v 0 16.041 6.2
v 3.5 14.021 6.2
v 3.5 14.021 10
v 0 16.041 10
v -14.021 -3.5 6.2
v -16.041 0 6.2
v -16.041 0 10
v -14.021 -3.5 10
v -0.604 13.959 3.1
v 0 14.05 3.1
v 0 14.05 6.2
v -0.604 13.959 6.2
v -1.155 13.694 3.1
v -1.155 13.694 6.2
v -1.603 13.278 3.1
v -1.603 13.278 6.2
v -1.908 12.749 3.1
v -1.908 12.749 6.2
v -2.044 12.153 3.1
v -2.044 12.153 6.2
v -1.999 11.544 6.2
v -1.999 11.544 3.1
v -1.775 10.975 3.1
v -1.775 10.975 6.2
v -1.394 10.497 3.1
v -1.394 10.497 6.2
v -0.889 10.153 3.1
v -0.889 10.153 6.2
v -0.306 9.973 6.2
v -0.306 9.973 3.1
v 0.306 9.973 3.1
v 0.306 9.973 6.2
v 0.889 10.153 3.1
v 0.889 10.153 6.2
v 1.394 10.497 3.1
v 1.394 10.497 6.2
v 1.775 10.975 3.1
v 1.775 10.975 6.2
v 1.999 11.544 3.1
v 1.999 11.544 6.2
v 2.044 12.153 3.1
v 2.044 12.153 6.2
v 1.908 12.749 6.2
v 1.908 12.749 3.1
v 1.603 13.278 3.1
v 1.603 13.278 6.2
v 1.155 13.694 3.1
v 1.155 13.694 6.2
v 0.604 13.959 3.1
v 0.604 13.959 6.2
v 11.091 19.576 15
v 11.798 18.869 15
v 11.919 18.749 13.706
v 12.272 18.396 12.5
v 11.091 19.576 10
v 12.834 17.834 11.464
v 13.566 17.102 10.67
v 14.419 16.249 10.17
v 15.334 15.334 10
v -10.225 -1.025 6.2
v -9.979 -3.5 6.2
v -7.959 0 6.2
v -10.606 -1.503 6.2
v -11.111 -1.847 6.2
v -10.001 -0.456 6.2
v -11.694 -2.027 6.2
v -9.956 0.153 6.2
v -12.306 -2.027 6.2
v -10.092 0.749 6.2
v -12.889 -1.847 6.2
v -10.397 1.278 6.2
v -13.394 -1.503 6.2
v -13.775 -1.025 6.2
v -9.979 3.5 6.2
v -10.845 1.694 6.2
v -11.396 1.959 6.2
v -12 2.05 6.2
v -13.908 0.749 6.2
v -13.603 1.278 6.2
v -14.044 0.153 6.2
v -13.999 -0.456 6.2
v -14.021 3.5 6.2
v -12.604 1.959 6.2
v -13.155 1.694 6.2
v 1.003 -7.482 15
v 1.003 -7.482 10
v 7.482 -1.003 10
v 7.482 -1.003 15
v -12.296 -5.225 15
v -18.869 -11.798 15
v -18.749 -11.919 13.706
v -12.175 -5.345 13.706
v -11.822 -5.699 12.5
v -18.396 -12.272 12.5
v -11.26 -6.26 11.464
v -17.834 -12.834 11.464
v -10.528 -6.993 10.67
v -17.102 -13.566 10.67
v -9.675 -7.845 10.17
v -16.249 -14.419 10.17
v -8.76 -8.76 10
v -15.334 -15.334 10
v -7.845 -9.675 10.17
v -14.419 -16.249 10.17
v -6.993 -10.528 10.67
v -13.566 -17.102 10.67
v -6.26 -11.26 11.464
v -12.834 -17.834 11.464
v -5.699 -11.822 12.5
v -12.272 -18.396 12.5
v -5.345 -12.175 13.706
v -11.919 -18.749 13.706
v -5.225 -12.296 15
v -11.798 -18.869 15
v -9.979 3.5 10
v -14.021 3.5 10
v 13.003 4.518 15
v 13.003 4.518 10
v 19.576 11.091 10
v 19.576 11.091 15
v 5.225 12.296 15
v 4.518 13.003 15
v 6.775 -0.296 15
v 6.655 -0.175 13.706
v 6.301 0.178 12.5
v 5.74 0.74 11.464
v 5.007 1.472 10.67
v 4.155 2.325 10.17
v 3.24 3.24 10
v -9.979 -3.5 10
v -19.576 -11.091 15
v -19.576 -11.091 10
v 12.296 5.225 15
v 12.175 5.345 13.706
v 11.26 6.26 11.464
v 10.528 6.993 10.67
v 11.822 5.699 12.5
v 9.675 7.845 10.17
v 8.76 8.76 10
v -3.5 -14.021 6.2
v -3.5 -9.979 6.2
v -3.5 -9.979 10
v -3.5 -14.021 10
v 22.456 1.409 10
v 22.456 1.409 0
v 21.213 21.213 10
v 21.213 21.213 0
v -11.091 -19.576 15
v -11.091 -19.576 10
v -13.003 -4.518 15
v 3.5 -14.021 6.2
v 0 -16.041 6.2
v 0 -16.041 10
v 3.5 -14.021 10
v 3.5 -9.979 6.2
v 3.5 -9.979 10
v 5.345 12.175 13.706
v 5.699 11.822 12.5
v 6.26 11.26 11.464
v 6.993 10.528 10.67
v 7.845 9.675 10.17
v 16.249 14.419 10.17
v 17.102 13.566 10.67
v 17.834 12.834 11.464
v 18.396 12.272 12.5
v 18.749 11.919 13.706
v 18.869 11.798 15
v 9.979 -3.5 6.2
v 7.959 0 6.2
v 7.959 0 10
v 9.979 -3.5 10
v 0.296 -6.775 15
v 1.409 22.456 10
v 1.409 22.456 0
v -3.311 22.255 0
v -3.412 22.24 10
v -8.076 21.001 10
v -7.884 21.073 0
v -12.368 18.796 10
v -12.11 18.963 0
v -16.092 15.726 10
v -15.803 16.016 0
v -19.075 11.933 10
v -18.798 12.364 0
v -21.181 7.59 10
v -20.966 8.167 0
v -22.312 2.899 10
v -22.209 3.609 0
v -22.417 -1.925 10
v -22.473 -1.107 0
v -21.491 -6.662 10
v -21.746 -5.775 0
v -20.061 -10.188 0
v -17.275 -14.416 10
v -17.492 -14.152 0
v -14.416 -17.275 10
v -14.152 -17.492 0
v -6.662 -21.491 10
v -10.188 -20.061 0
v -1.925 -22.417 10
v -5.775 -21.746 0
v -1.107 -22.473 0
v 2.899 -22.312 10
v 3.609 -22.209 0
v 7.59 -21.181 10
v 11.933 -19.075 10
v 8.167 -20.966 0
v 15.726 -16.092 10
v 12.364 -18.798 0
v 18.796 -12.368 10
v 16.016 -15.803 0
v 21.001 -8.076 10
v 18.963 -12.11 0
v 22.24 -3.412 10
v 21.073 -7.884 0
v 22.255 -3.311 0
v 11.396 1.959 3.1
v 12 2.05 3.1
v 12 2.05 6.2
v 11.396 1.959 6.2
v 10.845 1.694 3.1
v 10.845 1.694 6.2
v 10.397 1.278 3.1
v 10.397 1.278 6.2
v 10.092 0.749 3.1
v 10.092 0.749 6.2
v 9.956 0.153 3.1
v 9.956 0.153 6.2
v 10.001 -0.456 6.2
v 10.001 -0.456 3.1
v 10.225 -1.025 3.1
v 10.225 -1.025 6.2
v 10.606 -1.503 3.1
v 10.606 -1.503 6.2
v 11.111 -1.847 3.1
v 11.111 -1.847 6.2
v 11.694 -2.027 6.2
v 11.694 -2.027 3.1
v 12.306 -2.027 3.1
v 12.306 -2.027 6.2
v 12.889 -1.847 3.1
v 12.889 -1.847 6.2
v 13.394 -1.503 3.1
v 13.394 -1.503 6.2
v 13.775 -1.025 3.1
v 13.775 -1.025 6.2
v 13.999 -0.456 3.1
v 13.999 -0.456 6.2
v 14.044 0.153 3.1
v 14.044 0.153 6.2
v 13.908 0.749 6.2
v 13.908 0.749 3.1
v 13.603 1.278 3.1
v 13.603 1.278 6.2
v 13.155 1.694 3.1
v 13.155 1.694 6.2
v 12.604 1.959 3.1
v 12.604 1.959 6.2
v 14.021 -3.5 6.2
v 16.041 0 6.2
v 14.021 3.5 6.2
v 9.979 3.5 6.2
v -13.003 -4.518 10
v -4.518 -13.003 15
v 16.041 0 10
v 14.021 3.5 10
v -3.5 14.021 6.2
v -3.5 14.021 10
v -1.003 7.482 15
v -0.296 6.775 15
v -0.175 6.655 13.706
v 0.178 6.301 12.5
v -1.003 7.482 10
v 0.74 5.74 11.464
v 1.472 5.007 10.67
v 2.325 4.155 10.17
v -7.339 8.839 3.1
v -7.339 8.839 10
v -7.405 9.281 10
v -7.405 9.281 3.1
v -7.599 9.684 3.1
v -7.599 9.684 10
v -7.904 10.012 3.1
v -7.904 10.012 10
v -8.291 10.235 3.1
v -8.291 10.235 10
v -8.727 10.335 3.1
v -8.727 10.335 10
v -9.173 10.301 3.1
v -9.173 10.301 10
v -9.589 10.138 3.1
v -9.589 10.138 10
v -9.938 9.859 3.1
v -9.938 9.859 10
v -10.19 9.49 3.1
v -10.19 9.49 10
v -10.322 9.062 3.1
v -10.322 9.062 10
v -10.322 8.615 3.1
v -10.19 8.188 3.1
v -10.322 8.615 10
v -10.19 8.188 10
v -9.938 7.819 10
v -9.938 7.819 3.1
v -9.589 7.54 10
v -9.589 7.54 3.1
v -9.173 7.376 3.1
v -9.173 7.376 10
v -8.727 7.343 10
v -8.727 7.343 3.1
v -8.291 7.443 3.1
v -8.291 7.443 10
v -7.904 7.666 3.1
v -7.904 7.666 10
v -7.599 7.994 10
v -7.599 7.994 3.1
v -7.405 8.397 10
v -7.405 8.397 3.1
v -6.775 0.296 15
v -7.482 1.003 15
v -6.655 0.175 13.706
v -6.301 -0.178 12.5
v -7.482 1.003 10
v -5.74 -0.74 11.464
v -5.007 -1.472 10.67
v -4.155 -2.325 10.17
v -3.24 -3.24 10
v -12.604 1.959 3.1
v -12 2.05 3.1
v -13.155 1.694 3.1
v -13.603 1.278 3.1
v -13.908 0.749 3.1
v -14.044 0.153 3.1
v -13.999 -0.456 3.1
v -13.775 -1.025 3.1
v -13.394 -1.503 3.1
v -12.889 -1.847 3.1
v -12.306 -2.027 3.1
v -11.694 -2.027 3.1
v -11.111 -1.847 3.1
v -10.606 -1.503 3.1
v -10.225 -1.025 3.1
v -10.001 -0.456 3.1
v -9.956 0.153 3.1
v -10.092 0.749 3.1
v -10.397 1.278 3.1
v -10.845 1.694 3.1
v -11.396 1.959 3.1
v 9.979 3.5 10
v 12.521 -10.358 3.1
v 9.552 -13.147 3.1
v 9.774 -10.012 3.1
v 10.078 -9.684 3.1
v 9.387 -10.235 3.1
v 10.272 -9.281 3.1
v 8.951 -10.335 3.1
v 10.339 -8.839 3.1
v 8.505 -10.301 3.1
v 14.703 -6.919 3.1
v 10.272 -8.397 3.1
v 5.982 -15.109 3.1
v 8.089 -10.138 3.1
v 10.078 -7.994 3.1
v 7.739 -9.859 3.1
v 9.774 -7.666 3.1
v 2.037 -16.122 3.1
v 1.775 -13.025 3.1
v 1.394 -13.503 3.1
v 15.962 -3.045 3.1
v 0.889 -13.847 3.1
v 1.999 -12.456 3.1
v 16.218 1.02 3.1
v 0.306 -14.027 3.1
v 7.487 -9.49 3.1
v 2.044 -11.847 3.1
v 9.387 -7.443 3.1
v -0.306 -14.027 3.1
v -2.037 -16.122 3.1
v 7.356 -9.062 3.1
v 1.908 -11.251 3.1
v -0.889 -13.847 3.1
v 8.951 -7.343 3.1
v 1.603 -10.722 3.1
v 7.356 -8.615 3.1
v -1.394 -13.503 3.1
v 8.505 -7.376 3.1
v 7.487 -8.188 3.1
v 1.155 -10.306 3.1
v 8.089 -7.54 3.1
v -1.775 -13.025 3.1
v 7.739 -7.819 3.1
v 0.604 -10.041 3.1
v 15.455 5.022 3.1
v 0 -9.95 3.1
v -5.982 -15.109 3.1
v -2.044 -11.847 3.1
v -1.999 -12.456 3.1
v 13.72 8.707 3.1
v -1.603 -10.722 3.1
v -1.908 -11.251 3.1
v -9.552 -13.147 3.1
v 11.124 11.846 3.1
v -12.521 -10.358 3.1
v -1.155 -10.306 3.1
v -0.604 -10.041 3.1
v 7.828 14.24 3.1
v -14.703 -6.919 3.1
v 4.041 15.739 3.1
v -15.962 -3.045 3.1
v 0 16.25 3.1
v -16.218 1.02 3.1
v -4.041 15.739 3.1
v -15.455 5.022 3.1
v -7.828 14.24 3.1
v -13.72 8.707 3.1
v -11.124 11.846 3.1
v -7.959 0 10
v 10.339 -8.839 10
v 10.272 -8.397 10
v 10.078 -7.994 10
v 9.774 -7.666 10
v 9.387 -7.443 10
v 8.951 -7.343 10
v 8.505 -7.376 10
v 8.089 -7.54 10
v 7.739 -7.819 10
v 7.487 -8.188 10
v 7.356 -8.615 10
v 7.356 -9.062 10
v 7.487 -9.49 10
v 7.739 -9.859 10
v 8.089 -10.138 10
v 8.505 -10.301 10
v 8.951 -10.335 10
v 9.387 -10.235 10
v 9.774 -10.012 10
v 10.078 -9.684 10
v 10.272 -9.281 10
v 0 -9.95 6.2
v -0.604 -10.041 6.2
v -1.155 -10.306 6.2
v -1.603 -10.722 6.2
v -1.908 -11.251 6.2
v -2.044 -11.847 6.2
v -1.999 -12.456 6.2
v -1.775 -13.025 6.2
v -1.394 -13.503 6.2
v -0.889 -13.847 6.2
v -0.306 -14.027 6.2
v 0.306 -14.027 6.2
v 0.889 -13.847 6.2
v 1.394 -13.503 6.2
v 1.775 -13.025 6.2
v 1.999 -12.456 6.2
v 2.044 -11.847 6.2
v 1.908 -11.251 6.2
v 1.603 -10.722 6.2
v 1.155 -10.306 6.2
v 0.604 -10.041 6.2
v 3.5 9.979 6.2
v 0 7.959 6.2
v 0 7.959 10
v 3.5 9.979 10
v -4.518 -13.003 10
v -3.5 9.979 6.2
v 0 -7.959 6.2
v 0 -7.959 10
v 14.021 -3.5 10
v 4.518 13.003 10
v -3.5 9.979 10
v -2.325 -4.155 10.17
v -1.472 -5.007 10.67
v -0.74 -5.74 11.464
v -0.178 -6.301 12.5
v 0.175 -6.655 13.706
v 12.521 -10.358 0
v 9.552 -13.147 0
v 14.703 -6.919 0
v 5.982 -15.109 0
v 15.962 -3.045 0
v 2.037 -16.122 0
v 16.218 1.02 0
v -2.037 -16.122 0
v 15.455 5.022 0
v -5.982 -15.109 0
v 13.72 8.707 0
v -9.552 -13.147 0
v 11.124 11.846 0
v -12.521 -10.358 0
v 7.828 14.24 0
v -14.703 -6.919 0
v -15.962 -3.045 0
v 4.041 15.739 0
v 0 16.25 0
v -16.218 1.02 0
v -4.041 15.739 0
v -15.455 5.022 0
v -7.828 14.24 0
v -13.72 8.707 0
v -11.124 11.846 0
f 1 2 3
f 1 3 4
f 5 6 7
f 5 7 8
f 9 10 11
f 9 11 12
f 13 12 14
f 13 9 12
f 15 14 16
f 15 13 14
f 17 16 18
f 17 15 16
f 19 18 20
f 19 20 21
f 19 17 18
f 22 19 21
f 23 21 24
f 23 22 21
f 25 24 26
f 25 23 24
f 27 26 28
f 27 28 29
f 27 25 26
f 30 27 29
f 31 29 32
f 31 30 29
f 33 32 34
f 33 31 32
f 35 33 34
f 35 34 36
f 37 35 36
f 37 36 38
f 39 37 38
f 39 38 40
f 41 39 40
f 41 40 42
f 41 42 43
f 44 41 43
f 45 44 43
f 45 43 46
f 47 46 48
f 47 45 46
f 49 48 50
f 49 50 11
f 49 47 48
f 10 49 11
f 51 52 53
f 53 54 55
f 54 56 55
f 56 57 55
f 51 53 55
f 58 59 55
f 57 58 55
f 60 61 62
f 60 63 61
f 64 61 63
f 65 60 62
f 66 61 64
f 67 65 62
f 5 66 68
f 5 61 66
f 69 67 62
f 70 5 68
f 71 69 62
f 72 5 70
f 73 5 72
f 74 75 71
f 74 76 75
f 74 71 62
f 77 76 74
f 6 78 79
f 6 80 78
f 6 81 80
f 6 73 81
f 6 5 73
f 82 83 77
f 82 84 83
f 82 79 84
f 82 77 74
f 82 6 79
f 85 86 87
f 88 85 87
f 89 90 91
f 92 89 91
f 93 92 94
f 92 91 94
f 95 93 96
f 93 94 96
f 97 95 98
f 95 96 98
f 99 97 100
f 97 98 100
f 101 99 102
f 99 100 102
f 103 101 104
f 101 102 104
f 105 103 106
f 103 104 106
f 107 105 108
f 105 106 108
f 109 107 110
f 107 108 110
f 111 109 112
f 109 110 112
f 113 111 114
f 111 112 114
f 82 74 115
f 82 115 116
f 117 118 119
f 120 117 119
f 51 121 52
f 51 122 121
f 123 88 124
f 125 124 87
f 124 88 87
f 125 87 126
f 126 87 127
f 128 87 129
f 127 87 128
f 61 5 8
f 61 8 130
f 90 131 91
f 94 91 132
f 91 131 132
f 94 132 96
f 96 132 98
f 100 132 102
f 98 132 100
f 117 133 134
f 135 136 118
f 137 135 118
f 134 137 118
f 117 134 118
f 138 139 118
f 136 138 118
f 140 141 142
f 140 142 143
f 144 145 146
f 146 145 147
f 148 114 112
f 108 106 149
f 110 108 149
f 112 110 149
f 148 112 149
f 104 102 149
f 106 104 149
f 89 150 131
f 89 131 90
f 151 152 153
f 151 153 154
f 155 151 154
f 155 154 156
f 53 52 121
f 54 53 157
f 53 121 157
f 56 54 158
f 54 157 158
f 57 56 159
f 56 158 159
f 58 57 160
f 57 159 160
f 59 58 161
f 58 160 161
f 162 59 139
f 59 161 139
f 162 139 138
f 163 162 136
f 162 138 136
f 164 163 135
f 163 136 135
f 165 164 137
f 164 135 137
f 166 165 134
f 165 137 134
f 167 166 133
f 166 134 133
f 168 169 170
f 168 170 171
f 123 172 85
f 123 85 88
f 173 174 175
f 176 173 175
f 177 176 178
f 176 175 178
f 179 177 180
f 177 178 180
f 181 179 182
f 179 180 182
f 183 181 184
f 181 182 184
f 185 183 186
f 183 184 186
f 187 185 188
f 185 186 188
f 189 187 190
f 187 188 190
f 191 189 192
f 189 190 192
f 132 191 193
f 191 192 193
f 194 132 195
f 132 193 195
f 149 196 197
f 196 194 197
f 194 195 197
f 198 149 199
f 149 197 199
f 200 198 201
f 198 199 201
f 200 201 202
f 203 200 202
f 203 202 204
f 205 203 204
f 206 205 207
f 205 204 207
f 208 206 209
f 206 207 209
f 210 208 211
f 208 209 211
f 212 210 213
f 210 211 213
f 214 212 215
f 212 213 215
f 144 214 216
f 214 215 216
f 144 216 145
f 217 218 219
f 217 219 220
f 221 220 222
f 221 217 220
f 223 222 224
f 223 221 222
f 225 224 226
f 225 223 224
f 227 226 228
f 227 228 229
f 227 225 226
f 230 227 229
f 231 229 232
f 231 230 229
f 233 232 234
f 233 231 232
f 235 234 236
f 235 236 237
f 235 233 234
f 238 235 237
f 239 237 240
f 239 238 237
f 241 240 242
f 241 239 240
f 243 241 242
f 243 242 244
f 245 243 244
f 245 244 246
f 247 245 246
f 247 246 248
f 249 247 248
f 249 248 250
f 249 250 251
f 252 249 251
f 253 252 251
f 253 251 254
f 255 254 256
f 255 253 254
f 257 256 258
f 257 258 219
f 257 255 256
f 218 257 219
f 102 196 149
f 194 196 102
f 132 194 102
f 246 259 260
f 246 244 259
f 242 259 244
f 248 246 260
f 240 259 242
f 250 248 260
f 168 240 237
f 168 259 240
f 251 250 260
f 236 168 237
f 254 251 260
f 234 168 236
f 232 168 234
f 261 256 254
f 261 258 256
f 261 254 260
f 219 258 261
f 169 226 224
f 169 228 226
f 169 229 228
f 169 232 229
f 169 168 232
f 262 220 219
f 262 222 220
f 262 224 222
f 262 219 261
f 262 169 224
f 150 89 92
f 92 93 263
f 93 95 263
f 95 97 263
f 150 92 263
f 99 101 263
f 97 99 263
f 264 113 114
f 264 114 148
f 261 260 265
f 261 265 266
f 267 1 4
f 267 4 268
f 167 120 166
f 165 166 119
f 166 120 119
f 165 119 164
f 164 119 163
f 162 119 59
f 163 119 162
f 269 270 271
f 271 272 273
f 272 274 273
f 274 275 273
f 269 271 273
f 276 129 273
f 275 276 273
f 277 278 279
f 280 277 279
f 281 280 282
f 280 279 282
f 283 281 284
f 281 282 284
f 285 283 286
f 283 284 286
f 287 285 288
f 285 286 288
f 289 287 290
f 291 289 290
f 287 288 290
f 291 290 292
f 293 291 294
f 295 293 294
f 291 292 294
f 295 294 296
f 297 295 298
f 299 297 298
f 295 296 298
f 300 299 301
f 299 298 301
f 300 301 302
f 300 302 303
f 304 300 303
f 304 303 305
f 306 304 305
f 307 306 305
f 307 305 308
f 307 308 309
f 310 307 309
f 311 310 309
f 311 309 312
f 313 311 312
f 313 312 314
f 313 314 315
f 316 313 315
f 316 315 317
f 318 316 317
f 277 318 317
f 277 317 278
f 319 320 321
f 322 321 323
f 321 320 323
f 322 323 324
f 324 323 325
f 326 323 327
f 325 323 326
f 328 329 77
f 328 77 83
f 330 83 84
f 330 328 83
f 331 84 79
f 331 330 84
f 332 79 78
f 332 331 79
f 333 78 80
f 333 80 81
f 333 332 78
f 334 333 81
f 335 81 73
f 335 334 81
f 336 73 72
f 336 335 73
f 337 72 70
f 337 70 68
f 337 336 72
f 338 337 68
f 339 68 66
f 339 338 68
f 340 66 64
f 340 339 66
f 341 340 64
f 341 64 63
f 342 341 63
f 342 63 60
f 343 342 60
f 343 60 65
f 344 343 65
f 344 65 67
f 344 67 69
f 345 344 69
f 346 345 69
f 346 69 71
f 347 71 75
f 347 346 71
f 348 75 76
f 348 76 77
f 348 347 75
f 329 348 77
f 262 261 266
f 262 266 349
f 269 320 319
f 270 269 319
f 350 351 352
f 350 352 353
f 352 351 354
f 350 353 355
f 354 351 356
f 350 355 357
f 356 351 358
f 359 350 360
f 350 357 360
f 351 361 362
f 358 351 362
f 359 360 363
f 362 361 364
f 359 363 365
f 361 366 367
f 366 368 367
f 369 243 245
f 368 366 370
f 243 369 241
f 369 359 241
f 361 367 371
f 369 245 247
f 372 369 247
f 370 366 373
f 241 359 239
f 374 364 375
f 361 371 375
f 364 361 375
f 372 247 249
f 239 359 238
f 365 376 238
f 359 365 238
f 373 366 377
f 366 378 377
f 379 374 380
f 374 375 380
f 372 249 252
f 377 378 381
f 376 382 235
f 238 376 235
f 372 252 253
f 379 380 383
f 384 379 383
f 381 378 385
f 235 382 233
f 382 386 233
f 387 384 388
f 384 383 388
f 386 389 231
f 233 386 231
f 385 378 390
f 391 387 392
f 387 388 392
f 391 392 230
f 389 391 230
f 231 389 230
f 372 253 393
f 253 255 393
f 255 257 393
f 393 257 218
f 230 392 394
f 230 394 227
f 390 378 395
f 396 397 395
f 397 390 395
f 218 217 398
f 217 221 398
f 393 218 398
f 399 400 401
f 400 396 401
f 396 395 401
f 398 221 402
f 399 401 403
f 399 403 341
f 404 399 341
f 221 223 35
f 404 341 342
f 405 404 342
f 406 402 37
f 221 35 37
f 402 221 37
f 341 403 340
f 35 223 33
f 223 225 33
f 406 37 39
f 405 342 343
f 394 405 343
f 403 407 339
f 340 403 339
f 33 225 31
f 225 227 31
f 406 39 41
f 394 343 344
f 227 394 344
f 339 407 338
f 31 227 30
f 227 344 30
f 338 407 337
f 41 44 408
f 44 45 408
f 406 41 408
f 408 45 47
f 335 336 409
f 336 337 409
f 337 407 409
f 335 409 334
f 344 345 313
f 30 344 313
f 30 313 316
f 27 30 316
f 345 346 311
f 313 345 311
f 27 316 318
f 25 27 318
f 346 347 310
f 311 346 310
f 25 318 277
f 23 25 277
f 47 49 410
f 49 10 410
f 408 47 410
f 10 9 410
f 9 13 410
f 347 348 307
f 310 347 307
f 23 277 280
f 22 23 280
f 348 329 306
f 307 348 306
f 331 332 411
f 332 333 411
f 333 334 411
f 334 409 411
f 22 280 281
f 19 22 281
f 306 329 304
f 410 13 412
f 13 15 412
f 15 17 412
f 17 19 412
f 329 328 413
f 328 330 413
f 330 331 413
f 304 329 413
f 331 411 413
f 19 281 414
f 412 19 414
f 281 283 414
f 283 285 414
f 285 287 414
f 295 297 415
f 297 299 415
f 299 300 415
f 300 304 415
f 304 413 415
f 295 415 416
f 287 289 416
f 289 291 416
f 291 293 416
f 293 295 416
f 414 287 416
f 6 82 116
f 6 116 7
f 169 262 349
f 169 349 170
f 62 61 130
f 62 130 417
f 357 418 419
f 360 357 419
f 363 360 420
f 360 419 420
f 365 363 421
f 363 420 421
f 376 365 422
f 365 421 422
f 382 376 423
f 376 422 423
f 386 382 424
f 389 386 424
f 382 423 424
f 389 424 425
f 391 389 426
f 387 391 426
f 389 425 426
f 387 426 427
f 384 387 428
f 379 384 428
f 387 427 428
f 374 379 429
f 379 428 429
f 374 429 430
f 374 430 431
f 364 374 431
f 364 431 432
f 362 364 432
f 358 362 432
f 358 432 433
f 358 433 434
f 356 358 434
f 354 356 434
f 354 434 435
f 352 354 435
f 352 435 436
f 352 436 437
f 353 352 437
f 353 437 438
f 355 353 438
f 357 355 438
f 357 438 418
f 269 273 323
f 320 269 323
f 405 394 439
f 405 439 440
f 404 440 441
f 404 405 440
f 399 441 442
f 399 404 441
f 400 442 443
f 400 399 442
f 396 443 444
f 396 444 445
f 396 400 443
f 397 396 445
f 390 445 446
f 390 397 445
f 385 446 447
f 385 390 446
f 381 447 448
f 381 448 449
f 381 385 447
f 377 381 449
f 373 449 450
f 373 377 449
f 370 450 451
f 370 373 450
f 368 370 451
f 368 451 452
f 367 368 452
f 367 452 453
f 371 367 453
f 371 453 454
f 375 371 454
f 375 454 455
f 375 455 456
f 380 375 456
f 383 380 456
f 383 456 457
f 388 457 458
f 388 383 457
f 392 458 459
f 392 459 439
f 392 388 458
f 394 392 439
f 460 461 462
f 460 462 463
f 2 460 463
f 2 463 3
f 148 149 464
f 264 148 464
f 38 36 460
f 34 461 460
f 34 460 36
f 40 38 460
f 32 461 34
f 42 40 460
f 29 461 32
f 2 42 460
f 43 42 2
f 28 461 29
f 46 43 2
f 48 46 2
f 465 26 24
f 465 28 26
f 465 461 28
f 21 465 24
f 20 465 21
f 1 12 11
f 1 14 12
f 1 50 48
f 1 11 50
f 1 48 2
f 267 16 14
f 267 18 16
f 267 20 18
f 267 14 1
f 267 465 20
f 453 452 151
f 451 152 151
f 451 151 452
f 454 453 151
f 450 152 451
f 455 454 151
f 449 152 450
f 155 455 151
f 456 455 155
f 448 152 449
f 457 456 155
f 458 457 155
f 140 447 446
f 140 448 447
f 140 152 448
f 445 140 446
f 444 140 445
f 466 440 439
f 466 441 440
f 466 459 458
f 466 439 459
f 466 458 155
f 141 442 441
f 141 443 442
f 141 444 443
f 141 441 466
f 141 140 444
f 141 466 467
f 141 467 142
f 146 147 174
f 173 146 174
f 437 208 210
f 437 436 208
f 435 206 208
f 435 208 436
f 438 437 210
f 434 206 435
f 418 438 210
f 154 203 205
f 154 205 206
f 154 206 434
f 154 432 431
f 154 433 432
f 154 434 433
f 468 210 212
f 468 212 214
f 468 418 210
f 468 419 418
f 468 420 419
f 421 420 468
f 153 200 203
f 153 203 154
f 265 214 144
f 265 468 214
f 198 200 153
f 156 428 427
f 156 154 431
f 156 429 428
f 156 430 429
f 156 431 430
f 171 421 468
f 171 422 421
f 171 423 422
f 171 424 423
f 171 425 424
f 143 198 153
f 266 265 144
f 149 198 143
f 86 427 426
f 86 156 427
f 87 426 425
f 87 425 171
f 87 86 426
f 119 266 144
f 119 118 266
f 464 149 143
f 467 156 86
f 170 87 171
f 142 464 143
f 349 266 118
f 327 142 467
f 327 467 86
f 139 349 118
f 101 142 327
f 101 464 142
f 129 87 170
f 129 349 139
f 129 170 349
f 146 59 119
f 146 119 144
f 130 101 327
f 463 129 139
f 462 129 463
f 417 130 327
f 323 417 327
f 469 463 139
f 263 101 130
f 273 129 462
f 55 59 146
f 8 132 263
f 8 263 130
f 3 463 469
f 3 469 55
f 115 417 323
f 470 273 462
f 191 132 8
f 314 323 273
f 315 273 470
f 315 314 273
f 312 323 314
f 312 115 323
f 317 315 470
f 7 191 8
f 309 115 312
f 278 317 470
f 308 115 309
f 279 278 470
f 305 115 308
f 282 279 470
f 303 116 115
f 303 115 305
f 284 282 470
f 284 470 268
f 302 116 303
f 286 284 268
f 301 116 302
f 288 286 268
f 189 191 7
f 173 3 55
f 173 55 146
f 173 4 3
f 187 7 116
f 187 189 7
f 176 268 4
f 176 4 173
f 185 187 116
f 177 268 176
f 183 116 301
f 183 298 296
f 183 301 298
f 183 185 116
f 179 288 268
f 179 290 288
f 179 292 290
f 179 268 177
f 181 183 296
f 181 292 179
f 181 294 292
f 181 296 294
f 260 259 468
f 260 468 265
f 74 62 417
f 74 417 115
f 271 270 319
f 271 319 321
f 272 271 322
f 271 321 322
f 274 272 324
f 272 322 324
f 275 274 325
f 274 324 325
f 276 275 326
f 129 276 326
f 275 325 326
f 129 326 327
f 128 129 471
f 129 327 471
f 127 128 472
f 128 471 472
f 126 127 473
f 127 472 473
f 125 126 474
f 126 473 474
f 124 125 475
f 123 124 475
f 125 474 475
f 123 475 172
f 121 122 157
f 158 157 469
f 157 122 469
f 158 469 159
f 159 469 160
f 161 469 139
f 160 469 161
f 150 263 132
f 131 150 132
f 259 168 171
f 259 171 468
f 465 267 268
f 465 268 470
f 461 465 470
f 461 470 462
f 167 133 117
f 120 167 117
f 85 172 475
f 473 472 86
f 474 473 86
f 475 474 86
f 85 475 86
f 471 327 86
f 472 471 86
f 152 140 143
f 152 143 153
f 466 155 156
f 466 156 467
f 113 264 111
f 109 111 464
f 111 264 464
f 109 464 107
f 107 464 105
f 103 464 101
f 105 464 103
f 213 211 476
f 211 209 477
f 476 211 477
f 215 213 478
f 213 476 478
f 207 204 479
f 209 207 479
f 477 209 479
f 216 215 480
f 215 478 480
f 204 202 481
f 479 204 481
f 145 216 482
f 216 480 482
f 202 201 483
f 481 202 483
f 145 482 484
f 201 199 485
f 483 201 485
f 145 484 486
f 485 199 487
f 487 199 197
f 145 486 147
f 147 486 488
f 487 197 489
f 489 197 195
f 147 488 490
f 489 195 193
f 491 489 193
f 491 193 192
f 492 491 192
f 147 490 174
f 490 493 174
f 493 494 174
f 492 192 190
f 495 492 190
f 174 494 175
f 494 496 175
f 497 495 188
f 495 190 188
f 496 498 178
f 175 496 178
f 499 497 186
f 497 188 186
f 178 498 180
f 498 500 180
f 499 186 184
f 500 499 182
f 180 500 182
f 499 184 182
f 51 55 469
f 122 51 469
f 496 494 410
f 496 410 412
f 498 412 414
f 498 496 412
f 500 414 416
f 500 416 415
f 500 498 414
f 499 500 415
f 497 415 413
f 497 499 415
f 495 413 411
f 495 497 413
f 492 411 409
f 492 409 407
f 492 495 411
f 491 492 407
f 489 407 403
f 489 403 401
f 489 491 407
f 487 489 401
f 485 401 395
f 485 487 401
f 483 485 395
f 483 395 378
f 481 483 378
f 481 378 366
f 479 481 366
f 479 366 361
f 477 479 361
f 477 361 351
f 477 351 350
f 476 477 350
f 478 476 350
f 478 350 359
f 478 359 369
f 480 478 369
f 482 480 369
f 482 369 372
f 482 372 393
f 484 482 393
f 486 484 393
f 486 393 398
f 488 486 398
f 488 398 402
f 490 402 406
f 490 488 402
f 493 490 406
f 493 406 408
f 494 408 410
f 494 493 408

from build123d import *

# Parameters (mm, degrees)
SKETCH1_R               = 16.25
BOSS_EXTRUDE1_DEPTH     = 10
BOSS_EXTRUDE2_START     = 3.1
SKETCH1_3_R             = 16.25
BOSS_EXTRUDE2_DEPTH     = 6.9
BOSS_EXTRUDE3_START     = 3.1
SKETCH1_4_R             = 2.05
BOSS_EXTRUDE3_DEPTH     = 3.1
SKETCH2_R               = 1.5
CUT_EXTRUDE1_DEPTH      = 1
CUT_EXTRUDE1_DEPTH_BACK = 11
BOSS_EXTRUDE4_DEPTH     = 5
SKETCH3_R               = 5
CUT_EXTRUDE2_DEPTH      = 11.134556711
CUT_EXTRUDE2_DEPTH_BACK = 54.505053596


with BuildPart() as part:
    # Sketch1 → Boss-Extrude1 (new body)
    with BuildSketch(Plane(origin=(0, 0, 0), x_dir=(0, 1, 0), z_dir=(0, 0, 1))):
        with BuildLine():
            Line((21.213203436, -21.213203436), (22.455838333, -1.409015532))
            ThreePointArc((22.455838333, -1.409015532), (-15.909902577, 15.909902577), (1.409015532, -22.455838333))
            Line((1.409015532, -22.455838333), (21.213203436, -21.213203436))
        make_face()
        Circle(SKETCH1_R, mode=Mode.SUBTRACT)
    extrude(amount=BOSS_EXTRUDE1_DEPTH)

    # Sketch1<3> → Boss-Extrude2 (add)
    with BuildSketch(Plane(origin=(0, 0, 0), x_dir=(0, 1, 0), z_dir=(0, 0, 1)).offset(BOSS_EXTRUDE2_START)):
        Circle(SKETCH1_3_R)
        Polygon((-3.5, 9.979274058), (0, 7.958548116), (3.5, 9.979274058), (3.5, 14.020725942), (0, 16.041451884), (-3.5, 14.020725942), align=None, mode=Mode.SUBTRACT)
        Polygon((9.979274058, 3.5), (7.958548116, 0), (9.979274058, -3.5), (14.020725942, -3.5), (16.041451884, 0), (14.020725942, 3.5), align=None, mode=Mode.SUBTRACT)
        Polygon((3.5, -9.979274058), (0, -7.958548116), (-3.5, -9.979274058), (-3.5, -14.020725942), (0, -16.041451884), (3.5, -14.020725942), align=None, mode=Mode.SUBTRACT)
        Polygon((-9.979274058, -3.5), (-7.958548116, 0), (-9.979274058, 3.5), (-14.020725942, 3.5), (-16.041451884, 0), (-14.020725942, -3.5), align=None, mode=Mode.SUBTRACT)
    extrude(amount=BOSS_EXTRUDE2_DEPTH)

    # Sketch1<4> → Boss-Extrude3 (add)
    with BuildSketch(Plane(origin=(0, 0, 0), x_dir=(0, 1, 0), z_dir=(0, 0, 1)).offset(BOSS_EXTRUDE3_START)):
        Polygon((3.5, -14.020725942), (3.5, -9.979274058), (0, -7.958548116), (-3.5, -9.979274058), (-3.5, -14.020725942), (0, -16.041451884), align=None)
        with Locations((0, -12)):
            Circle(SKETCH1_4_R, mode=Mode.SUBTRACT)
        Polygon((14.020725942, 3.5), (9.979274058, 3.5), (7.958548116, 0), (9.979274058, -3.5), (14.020725942, -3.5), (16.041451884, 0), align=None)
        with Locations((12, 0)):
            Circle(SKETCH1_4_R, mode=Mode.SUBTRACT)
        Polygon((-3.5, 14.020725942), (-3.5, 9.979274058), (0, 7.958548116), (3.5, 9.979274058), (3.5, 14.020725942), (0, 16.041451884), align=None)
        with Locations((0, 12)):
            Circle(SKETCH1_4_R, mode=Mode.SUBTRACT)
        Polygon((-14.020725942, -3.5), (-9.979274058, -3.5), (-7.958548116, 0), (-9.979274058, 3.5), (-14.020725942, 3.5), (-16.041451884, 0), align=None)
        with Locations((-12, 0)):
            Circle(SKETCH1_4_R, mode=Mode.SUBTRACT)
    extrude(amount=BOSS_EXTRUDE3_DEPTH)

    # Sketch2 → Cut-Extrude1 (cut, two sides)
    with BuildSketch(Plane.XY.offset(10)) as cut_extrude1_sk:
        with Locations((8.838834765, -8.838834765)):
            Circle(SKETCH2_R)
        with Locations((-8.838834765, 8.838834765)):
            Circle(SKETCH2_R)
    extrude(amount=CUT_EXTRUDE1_DEPTH, mode=Mode.SUBTRACT)
    extrude(cut_extrude1_sk.sketch, amount=-CUT_EXTRUDE1_DEPTH_BACK, mode=Mode.SUBTRACT)

    # Sketch2<3> → Boss-Extrude4 (add)
    with BuildSketch(Plane.XY.offset(10)):
        Polygon((-5.224829065, -12.295896877), (-12.295896877, -5.224829065), (-18.869320131, -11.798252319), (-11.798252319, -18.869320131), align=None)
        Polygon((-12.295896877, -5.224829065), (-13.003003658, -4.517722284), (-19.576426912, -11.091145538), (-18.869320131, -11.798252319), align=None)
        Polygon((-4.517722284, -13.003003658), (-5.224829065, -12.295896877), (-11.798252319, -18.869320131), (-11.091145538, -19.576426912), align=None)
        Polygon((6.775170935, -0.295896877), (-0.295896877, 6.775170935), (-6.775170935, 0.295896877), (0.295896877, -6.775170935), align=None)
        Polygon((-0.295896877, 6.775170935), (-1.003003658, 7.482277716), (-7.482277716, 1.003003658), (-6.775170935, 0.295896877), align=None)
        Polygon((7.482277716, -1.003003658), (6.775170935, -0.295896877), (0.295896877, -6.775170935), (1.003003658, -7.482277716), align=None)
        Polygon((19.576426912, 11.091145538), (18.869320131, 11.798252319), (12.295896877, 5.224829065), (13.003003658, 4.517722284), align=None)
        Polygon((18.869320131, 11.798252319), (11.798252319, 18.869320131), (5.224829065, 12.295896877), (12.295896877, 5.224829065), align=None)
        Polygon((11.798252319, 18.869320131), (11.091145538, 19.576426912), (4.517722284, 13.003003658), (5.224829065, 12.295896877), align=None)
    extrude(amount=BOSS_EXTRUDE4_DEPTH)

    # Sketch3 → Cut-Extrude2 (cut, two sides)
    with BuildSketch(Plane(origin=(-15.333786225, -15.333786225, 0), x_dir=(0.707106781, -0.707106781, 0), z_dir=(-0.707106781, -0.707106781, 0))) as cut_extrude2_sk:
        with Locations((0, 15)):
            Circle(SKETCH3_R)
    extrude(amount=CUT_EXTRUDE2_DEPTH, mode=Mode.SUBTRACT)
    extrude(cut_extrude2_sk.sketch, amount=-CUT_EXTRUDE2_DEPTH_BACK, mode=Mode.SUBTRACT)


solid = part.part
